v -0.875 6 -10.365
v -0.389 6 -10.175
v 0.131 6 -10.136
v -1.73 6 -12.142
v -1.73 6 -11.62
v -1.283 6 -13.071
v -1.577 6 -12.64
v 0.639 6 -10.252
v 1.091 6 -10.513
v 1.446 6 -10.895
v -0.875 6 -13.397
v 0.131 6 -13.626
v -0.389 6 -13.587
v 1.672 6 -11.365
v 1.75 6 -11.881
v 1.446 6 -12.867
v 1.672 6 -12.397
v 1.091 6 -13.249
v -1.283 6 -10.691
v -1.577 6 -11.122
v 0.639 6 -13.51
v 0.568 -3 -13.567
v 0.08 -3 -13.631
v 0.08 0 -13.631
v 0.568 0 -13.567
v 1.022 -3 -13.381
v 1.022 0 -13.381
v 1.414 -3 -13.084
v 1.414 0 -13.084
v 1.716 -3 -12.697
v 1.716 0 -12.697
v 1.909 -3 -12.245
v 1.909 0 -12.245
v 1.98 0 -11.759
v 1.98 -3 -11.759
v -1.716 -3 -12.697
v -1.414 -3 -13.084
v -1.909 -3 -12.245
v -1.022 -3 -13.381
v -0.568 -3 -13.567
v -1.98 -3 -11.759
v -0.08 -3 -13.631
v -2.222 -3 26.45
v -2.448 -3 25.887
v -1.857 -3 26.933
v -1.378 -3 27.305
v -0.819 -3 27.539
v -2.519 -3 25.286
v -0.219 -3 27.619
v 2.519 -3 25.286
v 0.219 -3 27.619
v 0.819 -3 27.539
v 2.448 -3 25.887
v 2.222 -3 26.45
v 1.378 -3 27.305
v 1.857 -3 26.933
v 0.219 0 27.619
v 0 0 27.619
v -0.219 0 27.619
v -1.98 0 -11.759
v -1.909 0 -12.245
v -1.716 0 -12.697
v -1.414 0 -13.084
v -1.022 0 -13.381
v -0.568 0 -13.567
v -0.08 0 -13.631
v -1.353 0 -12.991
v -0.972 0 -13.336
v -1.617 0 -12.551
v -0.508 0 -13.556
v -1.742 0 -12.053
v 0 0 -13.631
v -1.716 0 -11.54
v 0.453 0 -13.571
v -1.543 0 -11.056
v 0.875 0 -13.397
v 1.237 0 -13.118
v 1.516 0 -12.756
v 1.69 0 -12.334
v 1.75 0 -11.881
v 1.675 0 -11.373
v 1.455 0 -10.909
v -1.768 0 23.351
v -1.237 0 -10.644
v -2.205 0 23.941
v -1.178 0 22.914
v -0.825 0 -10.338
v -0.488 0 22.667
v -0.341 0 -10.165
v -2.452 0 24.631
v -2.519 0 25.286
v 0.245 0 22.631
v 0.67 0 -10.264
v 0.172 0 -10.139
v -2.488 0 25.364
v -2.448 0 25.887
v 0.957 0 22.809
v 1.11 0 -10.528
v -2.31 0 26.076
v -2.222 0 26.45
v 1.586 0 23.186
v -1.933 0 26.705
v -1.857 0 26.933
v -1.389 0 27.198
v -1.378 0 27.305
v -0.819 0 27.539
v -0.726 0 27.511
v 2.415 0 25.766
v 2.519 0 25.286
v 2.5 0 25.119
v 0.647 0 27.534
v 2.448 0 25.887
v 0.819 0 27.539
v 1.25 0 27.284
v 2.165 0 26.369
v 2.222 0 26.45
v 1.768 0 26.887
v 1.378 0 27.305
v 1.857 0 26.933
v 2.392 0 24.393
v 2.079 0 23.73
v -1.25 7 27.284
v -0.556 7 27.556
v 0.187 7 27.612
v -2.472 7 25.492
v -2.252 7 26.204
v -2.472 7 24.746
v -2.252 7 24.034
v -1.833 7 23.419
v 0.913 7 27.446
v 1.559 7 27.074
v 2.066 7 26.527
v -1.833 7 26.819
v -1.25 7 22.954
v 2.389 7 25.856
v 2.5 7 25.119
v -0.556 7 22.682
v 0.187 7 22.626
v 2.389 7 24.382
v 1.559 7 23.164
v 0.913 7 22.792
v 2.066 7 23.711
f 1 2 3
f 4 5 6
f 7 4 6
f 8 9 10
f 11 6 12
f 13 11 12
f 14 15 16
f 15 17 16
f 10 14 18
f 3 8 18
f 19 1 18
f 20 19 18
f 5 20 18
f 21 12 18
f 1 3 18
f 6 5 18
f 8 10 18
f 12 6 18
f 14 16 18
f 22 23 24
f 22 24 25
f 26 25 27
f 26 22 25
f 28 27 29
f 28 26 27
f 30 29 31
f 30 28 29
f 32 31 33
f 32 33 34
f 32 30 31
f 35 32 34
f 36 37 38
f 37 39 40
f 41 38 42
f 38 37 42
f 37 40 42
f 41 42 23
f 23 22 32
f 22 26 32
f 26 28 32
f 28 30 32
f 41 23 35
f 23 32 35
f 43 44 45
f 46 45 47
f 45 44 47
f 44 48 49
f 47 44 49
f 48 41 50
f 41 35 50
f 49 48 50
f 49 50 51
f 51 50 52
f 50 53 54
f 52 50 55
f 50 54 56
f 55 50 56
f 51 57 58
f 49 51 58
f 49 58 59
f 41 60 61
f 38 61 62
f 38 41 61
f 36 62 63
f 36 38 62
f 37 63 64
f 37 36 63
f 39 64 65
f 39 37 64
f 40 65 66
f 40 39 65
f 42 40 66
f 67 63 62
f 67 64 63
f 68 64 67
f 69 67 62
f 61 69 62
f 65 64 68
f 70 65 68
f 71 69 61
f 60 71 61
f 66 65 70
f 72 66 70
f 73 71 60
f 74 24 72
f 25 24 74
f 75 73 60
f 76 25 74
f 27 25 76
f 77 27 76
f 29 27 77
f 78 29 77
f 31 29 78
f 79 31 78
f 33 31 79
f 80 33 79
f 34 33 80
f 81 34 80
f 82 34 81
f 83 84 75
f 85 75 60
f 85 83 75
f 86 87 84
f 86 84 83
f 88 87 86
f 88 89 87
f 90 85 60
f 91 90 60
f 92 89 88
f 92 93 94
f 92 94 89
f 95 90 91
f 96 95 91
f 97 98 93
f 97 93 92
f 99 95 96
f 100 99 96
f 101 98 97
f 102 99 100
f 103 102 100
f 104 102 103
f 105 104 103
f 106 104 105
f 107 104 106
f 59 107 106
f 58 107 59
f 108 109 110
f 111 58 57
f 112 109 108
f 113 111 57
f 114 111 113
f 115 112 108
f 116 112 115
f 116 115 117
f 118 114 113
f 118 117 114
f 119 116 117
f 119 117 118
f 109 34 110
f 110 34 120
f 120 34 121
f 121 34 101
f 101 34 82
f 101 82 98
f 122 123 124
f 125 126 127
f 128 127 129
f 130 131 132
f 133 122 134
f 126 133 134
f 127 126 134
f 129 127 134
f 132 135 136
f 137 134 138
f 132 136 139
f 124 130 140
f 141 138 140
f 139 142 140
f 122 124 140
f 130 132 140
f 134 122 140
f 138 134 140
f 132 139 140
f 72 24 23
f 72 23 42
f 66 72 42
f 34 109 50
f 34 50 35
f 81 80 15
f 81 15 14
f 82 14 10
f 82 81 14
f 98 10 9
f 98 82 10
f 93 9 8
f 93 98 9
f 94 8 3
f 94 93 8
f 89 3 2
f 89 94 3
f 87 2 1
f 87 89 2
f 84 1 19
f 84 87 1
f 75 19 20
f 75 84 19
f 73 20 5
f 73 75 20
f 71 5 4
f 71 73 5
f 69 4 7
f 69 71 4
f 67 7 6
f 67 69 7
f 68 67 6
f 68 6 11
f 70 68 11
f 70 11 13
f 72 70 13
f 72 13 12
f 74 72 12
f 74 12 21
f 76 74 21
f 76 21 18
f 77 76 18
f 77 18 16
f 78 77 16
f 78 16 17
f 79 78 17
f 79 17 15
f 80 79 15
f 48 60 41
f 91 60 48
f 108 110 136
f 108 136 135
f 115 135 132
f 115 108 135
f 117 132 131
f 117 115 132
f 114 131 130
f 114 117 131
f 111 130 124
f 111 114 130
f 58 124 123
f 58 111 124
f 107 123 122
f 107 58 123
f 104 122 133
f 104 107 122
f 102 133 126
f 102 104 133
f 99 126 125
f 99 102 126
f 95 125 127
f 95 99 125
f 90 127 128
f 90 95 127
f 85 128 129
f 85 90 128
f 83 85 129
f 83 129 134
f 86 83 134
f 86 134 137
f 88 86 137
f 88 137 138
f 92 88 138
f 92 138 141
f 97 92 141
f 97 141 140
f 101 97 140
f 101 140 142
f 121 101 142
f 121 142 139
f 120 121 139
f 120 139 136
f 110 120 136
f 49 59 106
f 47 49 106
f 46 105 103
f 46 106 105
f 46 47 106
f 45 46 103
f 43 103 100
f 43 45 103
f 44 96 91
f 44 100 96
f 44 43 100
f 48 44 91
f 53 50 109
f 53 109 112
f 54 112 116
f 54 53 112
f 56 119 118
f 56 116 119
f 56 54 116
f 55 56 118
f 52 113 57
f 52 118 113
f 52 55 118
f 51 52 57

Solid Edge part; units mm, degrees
sketch "Sketch1" plane through (0, 0, 0) normal (0, -1, 0) x (1, 0, 0)
  line L0 (-1.9529, -13.631) -> (-2.5525, 27.619)
  line L1 (0, 27.619) -> (-2.5525, 27.619)
  line L2 (0, 27.619) -> (2.5525, 27.619)
  line L3 (2.5525, 27.619) -> (1.9529, -13.631)
  line L4 (0, -13.631) -> (1.9529, -13.631)
  line L5 (0, -13.631) -> (-1.9529, -13.631)
extrude "ExtrudedProtrusion_1" add sketch "Sketch1" along normal blind 3
sketch "Sketch2" plane through (0, 0, 0) normal (0, -1, 0) x (1, 0, 0)
  circle A0 centre (0, 25.119) radius 2.5
extrude "Protusion_2" add sketch "Sketch2" against normal blind 7
sketch "Sketch3" plane through (0, 0, 0) normal (0, -1, 0) x (1, 0, 0)
  circle A0 centre (0, -11.881) radius 1.75
extrude "ExtrudedProtrusion_3" add sketch "Sketch3" against normal blind 6
fillet "Round1" radius 2.3 2 edges at (2.5525, -1.5, 27.619) (-2.5525, -1.5, 27.619)
fillet "Round_2" radius 1.9 2 edges at (1.9529, -1.5, -13.631) (-1.9529, -1.5, -13.631)
